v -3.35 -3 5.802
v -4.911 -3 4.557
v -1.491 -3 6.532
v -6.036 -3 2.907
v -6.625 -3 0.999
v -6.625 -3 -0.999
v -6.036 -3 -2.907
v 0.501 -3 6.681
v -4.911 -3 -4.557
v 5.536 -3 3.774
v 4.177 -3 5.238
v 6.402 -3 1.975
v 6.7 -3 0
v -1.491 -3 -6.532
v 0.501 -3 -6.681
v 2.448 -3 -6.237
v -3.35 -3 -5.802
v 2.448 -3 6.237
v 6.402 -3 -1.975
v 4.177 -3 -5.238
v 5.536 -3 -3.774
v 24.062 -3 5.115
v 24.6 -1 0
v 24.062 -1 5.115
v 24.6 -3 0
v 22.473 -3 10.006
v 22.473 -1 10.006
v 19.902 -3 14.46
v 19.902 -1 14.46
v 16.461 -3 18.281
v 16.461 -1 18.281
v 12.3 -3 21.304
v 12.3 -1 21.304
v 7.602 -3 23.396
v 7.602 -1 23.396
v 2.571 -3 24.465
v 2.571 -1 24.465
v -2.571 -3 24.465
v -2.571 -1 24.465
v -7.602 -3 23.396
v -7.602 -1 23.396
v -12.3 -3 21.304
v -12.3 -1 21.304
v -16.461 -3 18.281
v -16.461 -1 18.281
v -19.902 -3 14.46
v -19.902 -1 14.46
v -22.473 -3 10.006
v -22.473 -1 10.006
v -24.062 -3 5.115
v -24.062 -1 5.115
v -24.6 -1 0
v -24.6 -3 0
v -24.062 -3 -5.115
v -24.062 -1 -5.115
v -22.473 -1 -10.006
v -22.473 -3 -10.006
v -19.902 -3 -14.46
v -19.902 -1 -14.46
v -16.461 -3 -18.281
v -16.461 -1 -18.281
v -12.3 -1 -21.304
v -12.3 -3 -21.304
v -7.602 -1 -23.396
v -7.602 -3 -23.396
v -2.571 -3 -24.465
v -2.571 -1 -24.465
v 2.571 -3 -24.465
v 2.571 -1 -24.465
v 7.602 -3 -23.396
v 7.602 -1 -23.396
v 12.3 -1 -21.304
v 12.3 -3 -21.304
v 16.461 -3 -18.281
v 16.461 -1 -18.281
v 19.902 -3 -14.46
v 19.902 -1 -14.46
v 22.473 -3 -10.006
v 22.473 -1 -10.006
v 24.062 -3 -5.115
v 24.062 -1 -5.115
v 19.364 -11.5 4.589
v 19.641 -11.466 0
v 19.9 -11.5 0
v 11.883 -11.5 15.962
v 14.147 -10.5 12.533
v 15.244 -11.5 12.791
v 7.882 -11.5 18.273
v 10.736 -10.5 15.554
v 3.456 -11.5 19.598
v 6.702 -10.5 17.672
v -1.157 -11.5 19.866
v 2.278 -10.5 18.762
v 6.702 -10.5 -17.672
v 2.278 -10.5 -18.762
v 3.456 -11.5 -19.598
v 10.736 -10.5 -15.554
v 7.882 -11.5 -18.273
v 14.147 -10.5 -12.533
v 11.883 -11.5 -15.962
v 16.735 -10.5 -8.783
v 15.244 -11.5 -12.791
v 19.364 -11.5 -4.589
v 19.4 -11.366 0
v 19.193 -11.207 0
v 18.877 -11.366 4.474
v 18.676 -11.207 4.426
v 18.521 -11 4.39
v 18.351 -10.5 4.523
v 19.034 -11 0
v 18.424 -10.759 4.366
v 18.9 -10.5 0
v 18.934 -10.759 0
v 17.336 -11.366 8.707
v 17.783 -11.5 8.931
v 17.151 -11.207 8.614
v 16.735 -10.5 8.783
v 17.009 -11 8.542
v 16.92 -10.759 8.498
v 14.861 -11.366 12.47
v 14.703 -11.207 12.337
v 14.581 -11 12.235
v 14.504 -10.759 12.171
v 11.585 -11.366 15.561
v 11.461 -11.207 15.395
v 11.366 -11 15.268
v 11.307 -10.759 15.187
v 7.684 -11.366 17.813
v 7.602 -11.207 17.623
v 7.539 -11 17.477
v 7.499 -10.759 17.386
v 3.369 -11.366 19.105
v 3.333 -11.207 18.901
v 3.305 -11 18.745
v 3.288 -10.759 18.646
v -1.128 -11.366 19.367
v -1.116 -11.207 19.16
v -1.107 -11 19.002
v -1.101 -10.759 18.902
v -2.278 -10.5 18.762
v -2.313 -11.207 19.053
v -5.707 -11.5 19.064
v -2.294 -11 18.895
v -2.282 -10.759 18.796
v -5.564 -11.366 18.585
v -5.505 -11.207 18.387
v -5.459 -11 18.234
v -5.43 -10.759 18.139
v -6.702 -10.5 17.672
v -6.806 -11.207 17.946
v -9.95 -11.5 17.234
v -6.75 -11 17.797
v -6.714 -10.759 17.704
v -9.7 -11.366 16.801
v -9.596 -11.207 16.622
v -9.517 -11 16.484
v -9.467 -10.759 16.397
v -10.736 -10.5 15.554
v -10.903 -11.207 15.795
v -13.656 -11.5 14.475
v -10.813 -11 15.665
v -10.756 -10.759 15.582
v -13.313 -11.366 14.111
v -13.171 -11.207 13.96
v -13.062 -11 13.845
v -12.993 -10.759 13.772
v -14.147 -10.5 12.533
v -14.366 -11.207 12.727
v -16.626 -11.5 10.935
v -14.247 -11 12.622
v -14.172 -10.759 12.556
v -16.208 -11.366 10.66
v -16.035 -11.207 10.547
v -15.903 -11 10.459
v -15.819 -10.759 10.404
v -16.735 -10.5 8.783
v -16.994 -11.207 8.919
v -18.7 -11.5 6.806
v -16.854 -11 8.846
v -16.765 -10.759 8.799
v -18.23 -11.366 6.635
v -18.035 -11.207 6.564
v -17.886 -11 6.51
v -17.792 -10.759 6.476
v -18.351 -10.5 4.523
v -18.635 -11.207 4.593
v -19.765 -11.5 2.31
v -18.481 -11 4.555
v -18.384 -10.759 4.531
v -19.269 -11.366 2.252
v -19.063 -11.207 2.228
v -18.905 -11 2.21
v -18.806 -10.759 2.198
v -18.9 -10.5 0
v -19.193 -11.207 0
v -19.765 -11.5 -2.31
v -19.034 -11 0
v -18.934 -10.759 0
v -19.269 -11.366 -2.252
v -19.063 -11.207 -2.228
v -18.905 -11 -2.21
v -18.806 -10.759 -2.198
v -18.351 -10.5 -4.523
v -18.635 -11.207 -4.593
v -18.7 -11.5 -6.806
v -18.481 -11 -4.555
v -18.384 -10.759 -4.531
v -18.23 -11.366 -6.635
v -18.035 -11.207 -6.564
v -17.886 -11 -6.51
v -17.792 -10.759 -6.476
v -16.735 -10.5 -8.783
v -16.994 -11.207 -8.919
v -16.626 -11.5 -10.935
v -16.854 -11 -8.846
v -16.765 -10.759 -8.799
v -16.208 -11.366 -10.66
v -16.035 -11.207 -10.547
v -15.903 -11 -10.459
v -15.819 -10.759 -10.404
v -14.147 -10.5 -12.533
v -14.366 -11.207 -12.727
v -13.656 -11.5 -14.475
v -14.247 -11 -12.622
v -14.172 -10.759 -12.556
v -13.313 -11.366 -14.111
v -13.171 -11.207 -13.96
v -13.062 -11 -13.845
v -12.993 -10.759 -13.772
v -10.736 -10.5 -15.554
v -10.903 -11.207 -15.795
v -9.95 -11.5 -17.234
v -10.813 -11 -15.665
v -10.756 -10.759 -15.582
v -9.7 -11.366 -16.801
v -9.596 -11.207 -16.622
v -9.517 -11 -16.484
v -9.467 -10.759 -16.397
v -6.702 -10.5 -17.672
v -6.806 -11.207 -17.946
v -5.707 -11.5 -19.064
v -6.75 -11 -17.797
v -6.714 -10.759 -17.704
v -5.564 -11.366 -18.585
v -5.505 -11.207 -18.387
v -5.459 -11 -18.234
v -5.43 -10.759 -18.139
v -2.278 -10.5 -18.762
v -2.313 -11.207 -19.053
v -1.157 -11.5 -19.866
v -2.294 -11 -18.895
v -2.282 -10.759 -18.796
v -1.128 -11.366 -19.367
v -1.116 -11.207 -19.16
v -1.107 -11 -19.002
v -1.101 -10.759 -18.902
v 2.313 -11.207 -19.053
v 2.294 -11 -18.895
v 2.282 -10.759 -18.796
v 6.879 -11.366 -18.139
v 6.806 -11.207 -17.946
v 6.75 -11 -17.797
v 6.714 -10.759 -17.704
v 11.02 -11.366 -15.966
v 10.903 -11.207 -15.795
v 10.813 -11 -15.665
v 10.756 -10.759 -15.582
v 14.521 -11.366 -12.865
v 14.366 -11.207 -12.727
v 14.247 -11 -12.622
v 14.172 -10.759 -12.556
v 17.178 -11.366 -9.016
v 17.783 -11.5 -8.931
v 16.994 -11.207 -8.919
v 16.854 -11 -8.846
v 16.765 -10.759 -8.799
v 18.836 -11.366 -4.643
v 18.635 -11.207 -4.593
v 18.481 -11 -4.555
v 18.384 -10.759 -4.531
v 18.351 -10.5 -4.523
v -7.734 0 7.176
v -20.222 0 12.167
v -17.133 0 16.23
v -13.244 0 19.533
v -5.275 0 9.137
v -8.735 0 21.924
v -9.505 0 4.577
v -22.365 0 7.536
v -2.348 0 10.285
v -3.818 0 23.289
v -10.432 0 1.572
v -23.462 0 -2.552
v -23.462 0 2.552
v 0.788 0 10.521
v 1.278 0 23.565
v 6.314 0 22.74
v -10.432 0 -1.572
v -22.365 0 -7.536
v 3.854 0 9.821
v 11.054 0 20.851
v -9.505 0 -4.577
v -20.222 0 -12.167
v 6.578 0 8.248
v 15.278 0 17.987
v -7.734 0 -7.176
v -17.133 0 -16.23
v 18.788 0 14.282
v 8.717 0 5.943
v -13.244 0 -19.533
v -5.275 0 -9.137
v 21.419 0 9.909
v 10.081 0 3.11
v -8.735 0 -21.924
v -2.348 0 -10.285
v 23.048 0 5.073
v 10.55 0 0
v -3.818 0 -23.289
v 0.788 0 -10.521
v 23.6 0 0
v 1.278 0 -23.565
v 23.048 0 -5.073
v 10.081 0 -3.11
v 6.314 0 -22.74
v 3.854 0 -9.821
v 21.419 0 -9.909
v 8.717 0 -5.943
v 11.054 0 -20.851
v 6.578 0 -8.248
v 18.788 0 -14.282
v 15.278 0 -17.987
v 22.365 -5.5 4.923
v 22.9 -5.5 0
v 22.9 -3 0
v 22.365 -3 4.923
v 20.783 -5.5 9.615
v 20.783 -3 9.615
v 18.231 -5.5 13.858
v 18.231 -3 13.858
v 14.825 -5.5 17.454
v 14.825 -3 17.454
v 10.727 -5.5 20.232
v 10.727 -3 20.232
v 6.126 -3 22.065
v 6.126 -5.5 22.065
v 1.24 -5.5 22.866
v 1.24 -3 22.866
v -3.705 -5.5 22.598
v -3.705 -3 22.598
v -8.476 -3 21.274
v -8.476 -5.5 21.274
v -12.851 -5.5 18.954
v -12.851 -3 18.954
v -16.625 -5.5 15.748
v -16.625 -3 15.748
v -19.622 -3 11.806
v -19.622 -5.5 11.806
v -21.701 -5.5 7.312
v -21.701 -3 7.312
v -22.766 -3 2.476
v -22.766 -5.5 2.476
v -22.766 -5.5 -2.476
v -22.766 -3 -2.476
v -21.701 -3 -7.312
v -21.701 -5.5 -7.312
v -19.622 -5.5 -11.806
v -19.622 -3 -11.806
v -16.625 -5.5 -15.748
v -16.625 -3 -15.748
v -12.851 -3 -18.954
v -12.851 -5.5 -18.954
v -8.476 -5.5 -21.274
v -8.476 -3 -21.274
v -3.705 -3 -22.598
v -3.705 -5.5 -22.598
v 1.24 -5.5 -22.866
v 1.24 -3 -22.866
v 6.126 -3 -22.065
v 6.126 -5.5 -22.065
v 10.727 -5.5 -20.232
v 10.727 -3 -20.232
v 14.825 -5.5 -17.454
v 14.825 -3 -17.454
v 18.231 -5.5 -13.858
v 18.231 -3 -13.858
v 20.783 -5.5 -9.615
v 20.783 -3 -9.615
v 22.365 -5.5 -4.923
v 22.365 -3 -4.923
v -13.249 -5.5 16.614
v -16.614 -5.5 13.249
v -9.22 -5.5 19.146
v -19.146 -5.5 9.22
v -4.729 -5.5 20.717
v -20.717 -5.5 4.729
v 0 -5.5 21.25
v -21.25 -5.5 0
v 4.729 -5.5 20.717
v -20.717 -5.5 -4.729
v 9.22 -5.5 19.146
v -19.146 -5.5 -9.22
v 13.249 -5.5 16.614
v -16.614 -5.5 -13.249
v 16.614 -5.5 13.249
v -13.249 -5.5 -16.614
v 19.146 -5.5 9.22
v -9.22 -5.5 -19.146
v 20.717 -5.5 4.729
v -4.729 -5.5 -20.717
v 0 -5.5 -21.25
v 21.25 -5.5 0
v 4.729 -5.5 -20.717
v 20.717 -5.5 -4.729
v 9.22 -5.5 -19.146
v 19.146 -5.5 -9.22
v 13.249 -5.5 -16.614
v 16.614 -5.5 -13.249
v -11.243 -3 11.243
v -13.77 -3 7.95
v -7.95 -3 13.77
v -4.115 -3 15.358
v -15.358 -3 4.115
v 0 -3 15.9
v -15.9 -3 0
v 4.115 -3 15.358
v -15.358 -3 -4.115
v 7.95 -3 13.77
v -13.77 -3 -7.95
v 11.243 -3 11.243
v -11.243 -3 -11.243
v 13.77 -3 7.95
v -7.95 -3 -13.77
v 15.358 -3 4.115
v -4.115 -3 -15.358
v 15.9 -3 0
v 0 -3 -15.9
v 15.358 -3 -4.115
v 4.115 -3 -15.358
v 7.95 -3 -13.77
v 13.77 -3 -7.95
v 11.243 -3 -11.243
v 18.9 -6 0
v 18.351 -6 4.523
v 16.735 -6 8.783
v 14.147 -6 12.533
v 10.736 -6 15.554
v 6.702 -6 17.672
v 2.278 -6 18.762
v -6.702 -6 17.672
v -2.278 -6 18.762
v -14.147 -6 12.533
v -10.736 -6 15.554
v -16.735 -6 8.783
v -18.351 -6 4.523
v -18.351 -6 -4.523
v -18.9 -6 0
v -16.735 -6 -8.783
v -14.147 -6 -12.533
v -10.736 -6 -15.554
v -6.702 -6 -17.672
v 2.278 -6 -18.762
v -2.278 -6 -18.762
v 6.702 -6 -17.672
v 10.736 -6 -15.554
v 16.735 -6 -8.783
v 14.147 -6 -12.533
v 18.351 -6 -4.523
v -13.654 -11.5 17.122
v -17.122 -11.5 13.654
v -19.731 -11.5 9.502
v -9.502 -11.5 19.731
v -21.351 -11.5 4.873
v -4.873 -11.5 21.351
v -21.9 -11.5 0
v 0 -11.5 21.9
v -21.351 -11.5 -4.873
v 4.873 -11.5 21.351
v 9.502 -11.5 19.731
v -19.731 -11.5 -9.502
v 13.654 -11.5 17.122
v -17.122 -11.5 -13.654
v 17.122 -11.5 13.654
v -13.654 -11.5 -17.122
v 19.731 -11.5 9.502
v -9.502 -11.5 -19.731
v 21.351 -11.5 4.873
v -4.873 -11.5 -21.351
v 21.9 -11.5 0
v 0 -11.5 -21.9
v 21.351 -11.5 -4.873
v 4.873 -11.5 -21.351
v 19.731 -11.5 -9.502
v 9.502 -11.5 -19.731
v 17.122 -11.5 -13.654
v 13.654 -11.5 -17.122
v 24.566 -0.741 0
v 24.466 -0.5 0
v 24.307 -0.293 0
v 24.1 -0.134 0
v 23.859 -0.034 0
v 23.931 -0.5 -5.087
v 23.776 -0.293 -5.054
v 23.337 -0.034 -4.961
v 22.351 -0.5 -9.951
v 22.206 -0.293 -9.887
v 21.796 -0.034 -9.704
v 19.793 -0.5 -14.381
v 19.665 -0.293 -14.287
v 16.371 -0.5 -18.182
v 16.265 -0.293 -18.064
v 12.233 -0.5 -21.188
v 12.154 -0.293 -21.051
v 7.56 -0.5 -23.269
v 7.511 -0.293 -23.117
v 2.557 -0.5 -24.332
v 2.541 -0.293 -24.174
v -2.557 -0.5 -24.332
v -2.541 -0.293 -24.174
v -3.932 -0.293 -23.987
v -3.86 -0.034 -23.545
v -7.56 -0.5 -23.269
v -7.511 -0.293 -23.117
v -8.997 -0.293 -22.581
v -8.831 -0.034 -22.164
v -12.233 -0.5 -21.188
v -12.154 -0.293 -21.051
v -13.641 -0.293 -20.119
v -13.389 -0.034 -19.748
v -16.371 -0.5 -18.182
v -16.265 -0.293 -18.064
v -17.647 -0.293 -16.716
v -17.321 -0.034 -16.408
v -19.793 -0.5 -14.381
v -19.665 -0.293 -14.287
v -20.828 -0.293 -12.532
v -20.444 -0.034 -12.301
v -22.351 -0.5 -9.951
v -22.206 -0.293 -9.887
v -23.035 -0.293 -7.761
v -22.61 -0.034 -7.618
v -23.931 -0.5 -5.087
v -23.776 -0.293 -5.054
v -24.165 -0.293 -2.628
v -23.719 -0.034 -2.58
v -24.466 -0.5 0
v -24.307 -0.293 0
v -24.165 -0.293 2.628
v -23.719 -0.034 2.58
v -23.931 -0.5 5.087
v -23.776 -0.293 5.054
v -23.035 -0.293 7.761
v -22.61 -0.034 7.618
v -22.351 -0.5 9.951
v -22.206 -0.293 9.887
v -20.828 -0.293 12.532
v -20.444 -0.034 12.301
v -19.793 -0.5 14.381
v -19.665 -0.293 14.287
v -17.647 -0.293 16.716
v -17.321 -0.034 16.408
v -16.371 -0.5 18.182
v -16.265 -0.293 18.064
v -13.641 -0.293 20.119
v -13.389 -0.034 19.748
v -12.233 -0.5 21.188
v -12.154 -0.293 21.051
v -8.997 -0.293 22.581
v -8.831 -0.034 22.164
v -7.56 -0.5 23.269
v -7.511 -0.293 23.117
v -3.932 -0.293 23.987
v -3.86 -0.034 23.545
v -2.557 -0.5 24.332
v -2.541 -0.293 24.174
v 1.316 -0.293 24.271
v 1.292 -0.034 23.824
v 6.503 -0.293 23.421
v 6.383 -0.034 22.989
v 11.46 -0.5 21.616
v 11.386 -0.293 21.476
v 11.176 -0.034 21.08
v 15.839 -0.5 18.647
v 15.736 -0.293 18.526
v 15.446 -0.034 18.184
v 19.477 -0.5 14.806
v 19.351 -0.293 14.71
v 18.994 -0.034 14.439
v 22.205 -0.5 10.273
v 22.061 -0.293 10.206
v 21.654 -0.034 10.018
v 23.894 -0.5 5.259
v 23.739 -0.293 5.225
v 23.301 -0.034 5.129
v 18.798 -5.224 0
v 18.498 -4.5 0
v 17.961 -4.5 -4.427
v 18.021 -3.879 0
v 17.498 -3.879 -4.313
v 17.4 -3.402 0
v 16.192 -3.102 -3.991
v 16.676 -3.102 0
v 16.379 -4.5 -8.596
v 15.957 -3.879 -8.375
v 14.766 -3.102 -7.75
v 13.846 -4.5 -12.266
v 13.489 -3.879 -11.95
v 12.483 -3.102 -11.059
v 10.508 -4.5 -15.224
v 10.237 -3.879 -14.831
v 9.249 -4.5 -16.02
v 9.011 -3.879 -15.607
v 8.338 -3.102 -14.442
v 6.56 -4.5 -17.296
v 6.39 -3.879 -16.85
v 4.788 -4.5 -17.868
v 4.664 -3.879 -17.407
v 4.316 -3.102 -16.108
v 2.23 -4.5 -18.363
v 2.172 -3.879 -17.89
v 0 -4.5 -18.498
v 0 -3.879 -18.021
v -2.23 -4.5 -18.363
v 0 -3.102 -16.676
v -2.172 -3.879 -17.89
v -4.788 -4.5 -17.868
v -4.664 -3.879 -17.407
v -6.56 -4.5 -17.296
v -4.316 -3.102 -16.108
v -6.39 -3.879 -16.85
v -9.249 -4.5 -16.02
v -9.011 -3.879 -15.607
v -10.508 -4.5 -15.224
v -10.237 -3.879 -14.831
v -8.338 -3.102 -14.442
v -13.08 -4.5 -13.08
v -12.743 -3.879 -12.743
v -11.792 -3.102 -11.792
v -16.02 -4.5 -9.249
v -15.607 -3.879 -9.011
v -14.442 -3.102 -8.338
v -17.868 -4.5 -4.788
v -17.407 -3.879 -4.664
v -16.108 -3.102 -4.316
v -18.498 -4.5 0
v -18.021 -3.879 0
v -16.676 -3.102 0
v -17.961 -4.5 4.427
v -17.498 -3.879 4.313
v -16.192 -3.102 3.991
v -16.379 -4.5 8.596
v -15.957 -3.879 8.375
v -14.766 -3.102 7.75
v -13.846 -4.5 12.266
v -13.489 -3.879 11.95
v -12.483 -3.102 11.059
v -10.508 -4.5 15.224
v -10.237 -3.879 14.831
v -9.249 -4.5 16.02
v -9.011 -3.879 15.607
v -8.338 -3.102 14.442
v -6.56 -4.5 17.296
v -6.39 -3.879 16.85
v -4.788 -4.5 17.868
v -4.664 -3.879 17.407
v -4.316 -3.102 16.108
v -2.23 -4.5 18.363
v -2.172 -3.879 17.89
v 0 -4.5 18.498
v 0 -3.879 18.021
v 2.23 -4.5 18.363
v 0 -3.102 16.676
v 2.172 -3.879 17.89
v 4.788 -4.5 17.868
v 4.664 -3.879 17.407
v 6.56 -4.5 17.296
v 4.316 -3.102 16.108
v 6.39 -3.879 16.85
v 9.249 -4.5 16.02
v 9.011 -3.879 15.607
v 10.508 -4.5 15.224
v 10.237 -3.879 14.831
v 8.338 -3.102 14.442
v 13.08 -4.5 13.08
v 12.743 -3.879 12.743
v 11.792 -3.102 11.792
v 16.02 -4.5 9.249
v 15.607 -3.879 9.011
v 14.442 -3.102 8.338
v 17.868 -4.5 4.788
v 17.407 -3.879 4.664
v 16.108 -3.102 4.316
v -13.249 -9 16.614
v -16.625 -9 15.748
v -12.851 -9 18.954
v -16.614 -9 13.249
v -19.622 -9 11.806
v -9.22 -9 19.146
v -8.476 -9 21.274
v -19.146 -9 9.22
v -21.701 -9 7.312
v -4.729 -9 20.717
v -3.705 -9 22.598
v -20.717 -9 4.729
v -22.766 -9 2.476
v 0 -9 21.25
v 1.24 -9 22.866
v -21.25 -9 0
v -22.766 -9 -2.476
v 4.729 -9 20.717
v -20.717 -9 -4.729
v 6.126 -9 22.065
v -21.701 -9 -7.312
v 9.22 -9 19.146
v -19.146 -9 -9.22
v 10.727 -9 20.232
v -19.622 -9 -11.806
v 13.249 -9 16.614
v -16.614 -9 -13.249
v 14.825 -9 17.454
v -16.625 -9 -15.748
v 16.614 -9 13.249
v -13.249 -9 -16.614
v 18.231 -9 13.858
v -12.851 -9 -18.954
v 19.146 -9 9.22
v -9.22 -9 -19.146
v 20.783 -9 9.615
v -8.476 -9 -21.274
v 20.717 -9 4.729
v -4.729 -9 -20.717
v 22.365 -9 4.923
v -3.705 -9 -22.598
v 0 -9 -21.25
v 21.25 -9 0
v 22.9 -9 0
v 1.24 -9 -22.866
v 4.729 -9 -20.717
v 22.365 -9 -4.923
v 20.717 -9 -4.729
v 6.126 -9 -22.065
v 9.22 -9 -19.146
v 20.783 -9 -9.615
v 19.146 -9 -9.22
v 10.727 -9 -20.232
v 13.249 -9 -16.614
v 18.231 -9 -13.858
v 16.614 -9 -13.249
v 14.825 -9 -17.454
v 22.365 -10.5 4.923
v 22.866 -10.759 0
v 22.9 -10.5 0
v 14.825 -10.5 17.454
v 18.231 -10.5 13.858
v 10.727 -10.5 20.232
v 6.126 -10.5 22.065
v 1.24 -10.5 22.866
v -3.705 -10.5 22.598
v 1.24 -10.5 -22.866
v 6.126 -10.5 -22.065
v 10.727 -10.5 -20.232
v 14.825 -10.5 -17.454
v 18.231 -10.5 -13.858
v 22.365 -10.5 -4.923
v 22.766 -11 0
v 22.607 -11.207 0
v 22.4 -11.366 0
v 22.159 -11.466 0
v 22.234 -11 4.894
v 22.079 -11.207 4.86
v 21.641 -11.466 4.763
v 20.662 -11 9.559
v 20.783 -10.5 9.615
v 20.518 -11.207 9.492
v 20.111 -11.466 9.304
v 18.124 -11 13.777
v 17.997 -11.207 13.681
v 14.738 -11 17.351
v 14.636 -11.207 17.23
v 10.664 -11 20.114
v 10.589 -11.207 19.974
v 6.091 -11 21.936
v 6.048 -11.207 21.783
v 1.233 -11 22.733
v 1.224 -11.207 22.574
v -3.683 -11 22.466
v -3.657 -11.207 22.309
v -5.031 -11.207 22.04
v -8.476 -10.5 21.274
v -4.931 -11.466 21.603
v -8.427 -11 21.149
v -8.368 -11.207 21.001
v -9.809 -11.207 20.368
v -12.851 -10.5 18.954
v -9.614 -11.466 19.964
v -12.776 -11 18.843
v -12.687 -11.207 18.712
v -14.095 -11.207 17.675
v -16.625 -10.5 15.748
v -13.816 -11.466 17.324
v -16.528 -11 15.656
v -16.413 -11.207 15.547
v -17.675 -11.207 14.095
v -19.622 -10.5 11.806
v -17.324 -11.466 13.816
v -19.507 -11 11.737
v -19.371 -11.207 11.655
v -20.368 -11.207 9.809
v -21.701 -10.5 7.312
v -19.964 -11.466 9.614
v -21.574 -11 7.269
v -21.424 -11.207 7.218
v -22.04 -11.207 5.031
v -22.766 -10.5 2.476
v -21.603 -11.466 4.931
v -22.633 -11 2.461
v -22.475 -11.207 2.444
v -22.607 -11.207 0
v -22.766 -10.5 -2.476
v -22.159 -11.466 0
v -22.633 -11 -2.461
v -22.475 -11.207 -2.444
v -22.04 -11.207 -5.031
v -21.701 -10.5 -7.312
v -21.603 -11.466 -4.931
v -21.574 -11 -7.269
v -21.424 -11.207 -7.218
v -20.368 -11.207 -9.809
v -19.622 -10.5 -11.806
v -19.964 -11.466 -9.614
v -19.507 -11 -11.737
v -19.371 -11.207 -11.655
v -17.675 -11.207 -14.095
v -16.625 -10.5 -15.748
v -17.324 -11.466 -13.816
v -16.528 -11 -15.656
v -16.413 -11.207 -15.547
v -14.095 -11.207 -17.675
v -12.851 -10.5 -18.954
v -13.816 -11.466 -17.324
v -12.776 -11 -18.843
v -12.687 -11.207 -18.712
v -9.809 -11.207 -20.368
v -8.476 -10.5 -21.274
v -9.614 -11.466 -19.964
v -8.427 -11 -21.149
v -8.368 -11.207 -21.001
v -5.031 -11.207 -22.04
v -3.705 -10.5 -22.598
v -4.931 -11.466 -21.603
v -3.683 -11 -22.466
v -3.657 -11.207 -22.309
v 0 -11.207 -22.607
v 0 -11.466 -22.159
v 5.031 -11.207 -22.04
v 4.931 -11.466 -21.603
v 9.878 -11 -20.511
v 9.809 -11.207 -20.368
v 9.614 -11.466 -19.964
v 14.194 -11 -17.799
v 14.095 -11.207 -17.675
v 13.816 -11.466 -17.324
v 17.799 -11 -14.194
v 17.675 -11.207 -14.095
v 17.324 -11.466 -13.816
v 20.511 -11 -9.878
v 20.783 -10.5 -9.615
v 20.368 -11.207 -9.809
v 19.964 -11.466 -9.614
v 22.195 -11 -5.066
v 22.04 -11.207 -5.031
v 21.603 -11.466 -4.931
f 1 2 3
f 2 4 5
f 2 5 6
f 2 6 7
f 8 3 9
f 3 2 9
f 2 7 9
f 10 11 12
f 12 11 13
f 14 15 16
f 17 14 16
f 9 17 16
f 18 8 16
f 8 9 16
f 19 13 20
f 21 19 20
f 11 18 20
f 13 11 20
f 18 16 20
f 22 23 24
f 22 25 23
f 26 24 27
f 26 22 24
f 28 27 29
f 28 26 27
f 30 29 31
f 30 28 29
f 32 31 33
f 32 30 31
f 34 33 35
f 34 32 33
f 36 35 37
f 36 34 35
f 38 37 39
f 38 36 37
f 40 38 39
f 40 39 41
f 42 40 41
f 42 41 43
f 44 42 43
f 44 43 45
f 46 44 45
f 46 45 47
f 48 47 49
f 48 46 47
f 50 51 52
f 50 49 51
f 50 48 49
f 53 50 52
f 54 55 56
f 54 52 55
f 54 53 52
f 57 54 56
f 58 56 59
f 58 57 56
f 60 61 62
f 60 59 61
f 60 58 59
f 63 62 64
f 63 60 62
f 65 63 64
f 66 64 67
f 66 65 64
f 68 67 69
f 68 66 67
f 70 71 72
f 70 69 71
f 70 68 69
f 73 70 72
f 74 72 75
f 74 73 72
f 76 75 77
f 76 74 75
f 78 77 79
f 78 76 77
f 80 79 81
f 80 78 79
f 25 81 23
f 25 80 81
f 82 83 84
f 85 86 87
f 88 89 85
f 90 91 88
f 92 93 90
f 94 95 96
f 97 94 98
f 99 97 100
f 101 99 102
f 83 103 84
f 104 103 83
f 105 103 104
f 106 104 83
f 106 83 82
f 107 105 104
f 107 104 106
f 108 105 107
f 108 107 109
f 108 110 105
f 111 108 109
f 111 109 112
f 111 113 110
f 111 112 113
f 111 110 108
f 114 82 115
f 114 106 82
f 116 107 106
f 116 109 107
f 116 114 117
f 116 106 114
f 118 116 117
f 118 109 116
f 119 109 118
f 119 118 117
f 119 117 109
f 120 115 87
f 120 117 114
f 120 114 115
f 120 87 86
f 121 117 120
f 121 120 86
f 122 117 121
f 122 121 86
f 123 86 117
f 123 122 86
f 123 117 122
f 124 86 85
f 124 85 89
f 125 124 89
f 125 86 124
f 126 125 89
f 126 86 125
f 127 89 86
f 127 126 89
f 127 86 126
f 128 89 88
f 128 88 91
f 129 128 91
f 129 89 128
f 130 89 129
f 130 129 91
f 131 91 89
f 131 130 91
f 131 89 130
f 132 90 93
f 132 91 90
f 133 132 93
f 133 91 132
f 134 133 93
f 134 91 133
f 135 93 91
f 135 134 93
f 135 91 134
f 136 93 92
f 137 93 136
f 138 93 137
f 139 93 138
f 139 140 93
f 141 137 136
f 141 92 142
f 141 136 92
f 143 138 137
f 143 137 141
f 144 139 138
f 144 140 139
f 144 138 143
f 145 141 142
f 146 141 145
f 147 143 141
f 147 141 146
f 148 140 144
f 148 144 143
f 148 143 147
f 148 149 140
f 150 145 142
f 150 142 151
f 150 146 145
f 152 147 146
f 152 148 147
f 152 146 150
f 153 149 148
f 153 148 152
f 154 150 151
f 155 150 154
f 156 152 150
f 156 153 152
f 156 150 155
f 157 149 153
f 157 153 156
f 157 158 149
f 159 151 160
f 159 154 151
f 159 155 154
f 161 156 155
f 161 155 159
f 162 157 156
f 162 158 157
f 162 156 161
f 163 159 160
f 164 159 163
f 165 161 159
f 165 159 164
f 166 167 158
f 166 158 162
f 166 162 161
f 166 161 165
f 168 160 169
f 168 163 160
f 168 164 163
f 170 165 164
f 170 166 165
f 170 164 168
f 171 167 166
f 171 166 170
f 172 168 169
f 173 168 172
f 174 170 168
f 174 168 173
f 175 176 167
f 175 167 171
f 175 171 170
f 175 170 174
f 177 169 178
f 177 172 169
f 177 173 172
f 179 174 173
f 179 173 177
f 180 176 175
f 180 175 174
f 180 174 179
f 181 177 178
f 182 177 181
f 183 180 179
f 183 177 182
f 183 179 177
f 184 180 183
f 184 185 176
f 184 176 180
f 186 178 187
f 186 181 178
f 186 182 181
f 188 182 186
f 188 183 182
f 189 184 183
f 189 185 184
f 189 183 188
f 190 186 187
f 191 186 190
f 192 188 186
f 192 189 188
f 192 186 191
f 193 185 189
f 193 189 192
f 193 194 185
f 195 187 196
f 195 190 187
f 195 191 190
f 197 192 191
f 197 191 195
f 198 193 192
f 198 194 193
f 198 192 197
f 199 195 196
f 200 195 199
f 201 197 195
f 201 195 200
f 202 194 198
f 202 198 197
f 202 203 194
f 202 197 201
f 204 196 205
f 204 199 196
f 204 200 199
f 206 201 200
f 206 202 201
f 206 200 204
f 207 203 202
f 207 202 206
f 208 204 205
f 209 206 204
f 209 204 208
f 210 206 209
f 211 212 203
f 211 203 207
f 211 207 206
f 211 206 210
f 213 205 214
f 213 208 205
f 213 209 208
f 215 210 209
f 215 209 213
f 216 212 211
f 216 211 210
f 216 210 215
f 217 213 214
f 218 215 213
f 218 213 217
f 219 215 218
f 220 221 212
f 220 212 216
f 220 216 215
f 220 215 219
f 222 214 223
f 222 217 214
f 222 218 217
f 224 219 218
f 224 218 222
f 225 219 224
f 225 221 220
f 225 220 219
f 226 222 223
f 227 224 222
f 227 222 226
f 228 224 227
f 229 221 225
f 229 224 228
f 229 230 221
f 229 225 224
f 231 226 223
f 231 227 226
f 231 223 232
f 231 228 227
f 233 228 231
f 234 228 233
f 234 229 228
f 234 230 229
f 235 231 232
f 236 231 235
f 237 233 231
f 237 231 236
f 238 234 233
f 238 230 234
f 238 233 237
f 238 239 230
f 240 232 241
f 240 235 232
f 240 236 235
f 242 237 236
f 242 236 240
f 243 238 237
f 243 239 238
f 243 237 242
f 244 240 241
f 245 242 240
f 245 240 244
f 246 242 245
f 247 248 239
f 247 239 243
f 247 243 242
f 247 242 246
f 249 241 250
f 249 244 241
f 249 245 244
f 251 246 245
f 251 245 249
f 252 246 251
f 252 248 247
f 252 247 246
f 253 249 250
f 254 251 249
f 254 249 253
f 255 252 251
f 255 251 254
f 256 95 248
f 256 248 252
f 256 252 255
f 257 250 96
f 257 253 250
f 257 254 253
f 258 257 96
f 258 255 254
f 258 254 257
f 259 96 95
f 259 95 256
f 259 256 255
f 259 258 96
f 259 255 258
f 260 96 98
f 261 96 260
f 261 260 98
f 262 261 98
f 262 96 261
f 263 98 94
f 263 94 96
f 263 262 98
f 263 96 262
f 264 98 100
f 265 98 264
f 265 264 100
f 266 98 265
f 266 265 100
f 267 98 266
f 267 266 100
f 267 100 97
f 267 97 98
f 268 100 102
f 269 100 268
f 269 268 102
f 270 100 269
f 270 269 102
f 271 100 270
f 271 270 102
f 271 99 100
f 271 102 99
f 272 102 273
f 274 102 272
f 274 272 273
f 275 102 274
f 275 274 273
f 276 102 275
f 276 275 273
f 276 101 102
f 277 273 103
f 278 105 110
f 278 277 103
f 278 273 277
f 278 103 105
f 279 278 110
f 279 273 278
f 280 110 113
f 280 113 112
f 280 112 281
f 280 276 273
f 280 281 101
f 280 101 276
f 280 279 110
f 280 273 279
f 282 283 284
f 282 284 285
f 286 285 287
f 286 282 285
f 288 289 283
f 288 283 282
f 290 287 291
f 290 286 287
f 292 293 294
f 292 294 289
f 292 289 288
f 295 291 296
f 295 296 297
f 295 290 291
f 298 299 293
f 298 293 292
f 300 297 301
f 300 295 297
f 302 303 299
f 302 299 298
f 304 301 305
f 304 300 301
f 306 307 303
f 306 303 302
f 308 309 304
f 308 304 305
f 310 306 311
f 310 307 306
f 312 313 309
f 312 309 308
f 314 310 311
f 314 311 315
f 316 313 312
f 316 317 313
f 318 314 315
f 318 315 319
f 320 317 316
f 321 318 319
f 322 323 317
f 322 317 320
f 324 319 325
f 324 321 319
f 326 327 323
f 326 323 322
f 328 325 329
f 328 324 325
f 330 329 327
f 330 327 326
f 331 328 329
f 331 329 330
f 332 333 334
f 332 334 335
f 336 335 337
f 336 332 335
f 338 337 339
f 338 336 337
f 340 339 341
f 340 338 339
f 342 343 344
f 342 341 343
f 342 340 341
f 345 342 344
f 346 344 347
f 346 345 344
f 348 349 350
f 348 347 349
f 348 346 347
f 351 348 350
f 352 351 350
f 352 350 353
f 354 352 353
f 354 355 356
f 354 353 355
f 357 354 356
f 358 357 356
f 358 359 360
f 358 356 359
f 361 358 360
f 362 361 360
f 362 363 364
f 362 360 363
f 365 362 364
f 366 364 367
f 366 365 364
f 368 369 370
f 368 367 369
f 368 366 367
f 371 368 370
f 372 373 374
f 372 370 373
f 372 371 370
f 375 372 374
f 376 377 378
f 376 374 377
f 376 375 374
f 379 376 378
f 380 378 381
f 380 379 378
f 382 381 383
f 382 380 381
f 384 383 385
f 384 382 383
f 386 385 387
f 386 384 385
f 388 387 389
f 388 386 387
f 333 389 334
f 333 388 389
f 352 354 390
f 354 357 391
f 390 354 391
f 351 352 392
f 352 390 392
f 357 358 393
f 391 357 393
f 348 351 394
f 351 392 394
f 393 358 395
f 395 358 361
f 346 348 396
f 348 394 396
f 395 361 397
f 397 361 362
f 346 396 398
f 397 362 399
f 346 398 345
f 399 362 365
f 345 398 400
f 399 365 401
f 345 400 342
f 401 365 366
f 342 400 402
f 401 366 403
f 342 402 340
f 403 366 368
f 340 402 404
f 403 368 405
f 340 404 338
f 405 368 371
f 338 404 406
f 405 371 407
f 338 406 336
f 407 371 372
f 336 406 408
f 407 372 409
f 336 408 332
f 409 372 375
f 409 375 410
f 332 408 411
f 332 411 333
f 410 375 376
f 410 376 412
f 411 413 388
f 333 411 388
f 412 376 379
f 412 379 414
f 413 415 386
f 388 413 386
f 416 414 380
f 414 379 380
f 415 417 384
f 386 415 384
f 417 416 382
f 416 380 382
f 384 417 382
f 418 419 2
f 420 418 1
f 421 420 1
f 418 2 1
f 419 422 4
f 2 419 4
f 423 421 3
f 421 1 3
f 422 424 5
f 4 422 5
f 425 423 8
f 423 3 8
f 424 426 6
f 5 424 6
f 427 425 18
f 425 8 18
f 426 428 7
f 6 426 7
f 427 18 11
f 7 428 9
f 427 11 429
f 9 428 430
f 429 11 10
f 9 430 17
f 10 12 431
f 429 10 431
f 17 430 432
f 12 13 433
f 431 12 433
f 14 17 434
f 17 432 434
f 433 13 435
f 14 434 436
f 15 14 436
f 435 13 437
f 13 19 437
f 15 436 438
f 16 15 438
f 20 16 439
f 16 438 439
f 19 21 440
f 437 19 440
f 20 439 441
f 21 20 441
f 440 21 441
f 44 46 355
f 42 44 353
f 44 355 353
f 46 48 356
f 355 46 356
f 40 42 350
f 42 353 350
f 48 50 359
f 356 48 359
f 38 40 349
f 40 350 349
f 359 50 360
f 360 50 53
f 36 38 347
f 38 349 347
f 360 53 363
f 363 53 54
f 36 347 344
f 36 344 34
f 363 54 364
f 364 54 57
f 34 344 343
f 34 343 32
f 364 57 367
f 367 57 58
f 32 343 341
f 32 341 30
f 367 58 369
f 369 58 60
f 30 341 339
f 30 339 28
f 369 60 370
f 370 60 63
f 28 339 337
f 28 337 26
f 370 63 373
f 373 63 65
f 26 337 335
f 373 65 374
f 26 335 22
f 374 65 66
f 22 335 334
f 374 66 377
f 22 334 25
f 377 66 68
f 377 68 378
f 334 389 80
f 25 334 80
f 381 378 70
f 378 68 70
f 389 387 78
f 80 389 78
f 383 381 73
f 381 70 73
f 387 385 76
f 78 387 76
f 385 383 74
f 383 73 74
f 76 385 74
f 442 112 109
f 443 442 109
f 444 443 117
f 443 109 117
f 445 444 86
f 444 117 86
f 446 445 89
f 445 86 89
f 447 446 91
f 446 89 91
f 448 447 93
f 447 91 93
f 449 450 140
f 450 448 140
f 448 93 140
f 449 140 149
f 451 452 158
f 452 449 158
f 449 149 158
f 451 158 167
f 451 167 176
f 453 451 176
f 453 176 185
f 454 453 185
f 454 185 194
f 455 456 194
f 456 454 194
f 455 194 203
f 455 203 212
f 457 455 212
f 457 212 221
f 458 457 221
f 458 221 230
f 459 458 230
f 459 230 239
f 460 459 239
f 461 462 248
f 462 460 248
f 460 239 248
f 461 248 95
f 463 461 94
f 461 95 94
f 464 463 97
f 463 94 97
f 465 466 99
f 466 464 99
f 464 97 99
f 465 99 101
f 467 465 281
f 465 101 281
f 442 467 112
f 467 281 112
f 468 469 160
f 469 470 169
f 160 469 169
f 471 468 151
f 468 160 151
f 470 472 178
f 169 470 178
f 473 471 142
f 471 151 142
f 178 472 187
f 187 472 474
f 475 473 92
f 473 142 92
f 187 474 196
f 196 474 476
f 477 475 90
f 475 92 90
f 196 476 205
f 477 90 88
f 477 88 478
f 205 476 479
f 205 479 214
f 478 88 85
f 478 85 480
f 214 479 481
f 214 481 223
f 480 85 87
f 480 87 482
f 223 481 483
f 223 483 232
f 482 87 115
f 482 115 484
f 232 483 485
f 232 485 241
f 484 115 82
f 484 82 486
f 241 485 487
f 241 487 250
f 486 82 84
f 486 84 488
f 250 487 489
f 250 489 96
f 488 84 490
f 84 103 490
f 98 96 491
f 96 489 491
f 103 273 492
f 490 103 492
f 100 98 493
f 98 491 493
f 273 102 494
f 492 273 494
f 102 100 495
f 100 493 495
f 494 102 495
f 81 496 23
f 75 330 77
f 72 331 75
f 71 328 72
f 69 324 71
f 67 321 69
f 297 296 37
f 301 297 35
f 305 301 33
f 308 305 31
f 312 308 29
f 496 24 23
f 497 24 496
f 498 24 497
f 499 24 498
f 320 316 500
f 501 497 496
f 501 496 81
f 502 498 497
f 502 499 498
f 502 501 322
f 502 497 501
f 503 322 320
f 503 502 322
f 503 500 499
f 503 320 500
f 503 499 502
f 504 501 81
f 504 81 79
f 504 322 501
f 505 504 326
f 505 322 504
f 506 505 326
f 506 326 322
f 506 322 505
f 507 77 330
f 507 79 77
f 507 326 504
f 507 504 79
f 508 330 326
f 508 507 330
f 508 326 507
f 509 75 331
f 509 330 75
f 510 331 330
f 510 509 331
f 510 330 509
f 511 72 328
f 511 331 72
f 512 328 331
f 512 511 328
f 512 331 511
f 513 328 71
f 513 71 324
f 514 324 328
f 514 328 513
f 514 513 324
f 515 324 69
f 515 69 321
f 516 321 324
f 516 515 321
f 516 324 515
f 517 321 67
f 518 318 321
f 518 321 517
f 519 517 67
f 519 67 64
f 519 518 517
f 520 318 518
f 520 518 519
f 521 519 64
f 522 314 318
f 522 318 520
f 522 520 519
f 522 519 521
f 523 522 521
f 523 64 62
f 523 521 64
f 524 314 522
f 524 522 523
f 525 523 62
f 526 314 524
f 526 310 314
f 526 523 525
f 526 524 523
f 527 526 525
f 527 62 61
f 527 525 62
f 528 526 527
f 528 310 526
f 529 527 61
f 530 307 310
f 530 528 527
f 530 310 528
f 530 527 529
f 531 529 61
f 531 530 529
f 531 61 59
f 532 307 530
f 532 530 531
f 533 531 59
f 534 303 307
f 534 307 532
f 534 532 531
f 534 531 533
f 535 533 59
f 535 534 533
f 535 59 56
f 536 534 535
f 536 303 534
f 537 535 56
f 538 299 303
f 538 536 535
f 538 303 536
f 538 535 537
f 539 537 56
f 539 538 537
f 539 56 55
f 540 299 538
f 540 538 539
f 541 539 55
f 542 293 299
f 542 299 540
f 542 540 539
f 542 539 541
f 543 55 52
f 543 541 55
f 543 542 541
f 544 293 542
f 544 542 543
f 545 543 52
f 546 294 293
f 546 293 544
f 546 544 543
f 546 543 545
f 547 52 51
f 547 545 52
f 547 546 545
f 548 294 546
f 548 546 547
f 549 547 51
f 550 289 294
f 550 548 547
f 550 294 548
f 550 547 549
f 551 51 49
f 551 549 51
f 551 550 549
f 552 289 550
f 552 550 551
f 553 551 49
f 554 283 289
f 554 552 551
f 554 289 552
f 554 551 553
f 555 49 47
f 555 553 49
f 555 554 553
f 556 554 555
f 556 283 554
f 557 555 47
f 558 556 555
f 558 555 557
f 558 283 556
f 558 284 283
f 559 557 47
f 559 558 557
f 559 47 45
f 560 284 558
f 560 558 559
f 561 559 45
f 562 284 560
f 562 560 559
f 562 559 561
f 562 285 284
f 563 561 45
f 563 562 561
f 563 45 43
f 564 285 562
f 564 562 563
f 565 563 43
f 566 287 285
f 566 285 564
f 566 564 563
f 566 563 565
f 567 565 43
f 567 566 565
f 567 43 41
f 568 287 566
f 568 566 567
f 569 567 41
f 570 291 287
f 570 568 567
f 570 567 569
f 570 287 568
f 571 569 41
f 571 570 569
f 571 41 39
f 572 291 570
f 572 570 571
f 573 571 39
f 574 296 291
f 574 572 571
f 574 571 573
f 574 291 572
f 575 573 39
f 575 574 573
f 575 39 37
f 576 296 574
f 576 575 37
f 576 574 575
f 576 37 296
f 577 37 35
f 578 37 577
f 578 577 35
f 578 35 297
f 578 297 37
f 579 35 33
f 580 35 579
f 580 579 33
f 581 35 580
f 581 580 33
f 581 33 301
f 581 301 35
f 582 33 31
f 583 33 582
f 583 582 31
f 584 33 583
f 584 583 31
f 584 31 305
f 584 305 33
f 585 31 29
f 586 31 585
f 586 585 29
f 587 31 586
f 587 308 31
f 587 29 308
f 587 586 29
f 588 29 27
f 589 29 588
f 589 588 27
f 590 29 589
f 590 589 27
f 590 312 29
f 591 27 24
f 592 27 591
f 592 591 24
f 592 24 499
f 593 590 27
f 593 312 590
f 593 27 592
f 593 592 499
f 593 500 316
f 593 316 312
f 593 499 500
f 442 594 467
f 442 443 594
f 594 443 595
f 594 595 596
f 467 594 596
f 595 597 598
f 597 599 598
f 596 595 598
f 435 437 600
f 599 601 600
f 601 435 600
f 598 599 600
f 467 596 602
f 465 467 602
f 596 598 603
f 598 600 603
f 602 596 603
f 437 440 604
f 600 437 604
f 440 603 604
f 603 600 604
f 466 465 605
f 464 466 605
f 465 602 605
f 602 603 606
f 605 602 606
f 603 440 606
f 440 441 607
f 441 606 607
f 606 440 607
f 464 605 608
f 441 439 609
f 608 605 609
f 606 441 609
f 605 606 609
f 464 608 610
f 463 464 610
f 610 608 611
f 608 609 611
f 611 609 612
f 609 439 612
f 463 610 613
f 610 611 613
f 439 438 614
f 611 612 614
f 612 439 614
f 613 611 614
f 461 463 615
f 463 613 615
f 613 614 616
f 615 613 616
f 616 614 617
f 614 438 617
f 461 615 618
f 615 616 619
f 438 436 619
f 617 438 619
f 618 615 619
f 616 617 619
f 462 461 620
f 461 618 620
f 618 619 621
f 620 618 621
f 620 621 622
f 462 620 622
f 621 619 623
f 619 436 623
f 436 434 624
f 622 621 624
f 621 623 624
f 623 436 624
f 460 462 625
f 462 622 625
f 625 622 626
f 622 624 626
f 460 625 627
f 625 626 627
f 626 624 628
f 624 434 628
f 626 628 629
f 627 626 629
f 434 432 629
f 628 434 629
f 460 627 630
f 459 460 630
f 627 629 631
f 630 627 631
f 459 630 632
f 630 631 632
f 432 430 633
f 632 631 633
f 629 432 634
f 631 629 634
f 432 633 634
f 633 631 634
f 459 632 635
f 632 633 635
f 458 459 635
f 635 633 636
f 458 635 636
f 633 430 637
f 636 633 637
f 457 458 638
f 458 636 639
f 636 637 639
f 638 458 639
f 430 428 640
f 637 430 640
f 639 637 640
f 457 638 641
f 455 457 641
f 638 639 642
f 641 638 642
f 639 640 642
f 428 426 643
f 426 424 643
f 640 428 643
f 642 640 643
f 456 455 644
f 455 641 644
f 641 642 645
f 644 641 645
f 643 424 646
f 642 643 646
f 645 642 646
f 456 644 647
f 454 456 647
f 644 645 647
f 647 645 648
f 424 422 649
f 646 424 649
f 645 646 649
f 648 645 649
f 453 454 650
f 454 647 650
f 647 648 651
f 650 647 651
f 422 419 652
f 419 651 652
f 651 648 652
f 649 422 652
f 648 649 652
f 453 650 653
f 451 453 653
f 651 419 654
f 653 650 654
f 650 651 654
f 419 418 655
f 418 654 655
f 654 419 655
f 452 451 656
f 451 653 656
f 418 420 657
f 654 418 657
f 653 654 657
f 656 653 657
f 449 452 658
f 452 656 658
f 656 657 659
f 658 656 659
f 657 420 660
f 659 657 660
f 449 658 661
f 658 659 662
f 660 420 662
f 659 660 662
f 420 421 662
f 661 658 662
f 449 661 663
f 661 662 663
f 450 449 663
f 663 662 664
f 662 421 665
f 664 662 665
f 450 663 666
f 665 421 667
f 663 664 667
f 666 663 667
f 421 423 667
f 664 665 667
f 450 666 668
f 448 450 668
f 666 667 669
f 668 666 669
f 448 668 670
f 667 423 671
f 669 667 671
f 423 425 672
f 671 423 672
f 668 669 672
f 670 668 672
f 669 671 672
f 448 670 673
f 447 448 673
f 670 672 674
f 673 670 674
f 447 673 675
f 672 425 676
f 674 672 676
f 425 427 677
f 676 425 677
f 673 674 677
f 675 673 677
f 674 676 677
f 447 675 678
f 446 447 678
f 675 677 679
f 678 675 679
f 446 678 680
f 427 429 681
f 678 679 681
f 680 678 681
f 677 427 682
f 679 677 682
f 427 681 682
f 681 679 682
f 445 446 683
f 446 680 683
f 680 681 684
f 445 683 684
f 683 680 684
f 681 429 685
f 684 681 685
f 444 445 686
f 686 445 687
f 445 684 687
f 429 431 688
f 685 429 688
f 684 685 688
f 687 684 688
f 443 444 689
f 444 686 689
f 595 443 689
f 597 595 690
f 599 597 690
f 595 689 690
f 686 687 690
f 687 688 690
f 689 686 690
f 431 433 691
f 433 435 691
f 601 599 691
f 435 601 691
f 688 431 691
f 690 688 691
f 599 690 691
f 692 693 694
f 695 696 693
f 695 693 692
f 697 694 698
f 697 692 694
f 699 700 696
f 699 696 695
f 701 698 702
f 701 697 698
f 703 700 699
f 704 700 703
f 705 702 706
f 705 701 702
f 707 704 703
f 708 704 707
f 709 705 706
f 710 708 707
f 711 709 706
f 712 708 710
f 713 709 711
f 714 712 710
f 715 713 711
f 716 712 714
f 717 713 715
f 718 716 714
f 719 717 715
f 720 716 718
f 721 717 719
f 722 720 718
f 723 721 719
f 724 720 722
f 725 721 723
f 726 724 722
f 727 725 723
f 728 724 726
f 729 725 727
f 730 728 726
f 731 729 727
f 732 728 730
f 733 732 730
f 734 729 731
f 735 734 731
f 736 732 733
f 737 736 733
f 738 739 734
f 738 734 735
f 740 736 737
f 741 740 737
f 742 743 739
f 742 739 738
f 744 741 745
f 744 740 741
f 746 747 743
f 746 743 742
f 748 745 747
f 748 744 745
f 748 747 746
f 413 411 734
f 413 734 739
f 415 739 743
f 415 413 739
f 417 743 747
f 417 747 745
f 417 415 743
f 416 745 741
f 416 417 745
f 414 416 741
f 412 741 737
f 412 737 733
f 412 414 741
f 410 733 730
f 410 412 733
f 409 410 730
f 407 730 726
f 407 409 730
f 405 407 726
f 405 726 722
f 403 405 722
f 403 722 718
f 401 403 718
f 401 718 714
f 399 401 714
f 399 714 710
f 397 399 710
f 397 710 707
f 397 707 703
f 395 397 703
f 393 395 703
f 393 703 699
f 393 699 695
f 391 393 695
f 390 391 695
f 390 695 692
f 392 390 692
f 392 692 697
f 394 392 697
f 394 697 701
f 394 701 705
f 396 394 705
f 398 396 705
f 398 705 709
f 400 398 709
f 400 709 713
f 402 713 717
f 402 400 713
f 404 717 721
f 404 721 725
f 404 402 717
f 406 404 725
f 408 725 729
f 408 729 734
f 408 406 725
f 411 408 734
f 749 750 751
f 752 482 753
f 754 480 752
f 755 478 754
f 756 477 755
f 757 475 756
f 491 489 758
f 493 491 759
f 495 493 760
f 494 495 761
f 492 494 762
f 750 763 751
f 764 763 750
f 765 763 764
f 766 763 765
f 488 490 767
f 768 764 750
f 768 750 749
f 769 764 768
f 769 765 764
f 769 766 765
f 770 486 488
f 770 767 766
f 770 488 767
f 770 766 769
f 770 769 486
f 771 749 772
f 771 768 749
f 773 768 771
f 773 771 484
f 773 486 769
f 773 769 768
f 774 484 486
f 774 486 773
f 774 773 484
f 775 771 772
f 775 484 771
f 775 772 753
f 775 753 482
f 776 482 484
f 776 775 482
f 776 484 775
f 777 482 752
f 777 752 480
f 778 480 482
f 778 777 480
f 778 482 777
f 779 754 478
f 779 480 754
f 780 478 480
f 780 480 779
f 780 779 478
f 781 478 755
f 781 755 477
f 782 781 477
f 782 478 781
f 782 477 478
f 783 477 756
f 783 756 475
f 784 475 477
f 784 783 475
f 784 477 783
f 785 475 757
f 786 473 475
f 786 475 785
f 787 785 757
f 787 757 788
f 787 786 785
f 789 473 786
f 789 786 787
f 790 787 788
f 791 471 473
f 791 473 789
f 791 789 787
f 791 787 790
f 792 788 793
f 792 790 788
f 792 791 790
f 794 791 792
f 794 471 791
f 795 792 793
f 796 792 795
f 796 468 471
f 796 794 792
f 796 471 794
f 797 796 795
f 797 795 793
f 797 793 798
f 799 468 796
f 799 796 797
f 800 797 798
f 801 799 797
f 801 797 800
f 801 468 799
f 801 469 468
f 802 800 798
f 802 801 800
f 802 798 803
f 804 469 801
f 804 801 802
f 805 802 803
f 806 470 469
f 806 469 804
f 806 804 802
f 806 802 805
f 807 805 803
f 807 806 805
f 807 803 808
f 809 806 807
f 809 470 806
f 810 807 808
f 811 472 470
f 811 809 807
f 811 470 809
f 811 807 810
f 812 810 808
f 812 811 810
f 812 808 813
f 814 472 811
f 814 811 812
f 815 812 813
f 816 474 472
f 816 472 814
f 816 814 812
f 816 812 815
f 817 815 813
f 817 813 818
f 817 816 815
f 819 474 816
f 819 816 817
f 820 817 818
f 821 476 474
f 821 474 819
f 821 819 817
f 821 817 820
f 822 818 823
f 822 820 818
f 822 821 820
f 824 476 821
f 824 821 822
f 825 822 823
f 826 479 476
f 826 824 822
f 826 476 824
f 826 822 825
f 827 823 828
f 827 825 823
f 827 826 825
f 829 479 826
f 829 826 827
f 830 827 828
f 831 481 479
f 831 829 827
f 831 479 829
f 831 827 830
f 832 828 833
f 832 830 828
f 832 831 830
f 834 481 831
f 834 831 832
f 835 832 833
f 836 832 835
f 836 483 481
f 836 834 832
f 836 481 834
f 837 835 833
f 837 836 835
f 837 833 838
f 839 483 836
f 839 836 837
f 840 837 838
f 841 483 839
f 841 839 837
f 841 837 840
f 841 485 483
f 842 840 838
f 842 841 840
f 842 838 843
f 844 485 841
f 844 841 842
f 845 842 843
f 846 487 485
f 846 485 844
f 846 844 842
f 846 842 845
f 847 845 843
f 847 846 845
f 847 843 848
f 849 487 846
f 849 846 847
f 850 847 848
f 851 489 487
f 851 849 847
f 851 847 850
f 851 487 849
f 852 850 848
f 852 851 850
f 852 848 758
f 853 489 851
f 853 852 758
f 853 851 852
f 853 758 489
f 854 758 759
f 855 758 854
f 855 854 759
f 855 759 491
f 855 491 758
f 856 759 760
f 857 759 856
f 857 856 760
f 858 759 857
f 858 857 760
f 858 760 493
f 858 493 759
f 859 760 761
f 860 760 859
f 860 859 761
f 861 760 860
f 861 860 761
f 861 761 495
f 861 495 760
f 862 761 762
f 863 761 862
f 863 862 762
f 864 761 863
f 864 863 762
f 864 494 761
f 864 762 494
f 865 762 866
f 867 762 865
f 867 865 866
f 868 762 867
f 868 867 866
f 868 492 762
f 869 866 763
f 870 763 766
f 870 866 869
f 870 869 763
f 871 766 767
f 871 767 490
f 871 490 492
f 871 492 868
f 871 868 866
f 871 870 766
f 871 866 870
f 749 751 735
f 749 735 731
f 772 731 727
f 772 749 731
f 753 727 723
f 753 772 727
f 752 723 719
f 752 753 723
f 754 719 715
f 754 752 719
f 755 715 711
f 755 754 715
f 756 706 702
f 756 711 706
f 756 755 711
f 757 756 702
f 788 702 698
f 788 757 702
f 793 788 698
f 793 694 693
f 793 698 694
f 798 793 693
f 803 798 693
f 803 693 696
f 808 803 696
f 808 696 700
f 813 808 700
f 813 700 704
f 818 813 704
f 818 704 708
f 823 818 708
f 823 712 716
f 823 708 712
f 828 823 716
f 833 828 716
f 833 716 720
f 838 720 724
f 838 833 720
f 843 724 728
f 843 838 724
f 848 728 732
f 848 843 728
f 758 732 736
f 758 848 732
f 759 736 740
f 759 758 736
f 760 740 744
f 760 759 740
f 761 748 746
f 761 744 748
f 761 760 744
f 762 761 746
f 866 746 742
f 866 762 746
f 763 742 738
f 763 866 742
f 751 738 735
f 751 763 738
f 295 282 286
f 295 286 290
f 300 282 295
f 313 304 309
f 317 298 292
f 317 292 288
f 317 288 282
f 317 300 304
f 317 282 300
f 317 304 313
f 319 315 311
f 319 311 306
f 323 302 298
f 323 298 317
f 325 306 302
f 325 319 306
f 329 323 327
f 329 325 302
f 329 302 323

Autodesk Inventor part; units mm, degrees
ref_plane "YZ Plane" through (0, 0, 0) normal (1, 0, 0) x (0, 1, 0)
ref_plane "XZ Plane" through (0, 0, 0) normal (0, 1, 0) x (-1, 0, 0)
ref_plane "XY Plane" through (0, 0, 0) normal (0, 0, 1) x (1, 0, 0)
sketch "Sketch1" plane through (0, 0, 0) normal (0, 0, 1) x (1, 0, 0)
  line L0 (-24.6, 0) -> (24.6, 0) construction
  line L1 (24.6, 0) -> (24.6, -3)
  line L2 (24.6, -3) -> (-24.6, -3) construction
  line L3 (-24.6, -3) -> (-24.6, 0)
  line L4 (-22.9, -3) -> (22.9, -3) construction
  line L5 (22.9, -3) -> (22.9, -11.5) construction
  line L6 (22.9, -11.5) -> (-22.9, -11.5) construction
  line L7 (-22.9, -11.5) -> (-22.9, -3)
  line L8 (22.9, -9) -> (21.25, -9)
  line L9 (21.25, -9) -> (21.25, -5.5)
  line L10 (21.25, -5.5) -> (22.9, -5.5)
  line L11 (22.9, -5.5) -> (22.9, -9) construction
  line L12 (-10.55, 40) -> (10.55, 40) construction
  line L13 (10.55, 40) -> (10.55, 0) construction
  line L14 (10.55, 0) -> (-10.55, 0) construction
  line L15 (-10.55, 0) -> (-10.55, 40) construction
  line L16 (-10.92, 40) -> (10.92, 40) construction
  line L17 (-11.19, 19) -> (11.19, 19) construction
  line L18 (-10.92, 40) -> (-11.19, 19)
  line L19 (10.92, 40) -> (11.19, 19)
  line L20 (-6.7, 40) -> (6.7, 40) construction
  line L21 (6.7, 40) -> (6.7, -3) construction
  line L22 (6.7, -3) -> (-6.7, -3) construction
  line L23 (-6.7, -3) -> (-6.7, 40) construction
  line L24 (-18.9, -3) -> (18.9, -3) construction
  line L25 (18.9, -3) -> (18.9, -11.5)
  line L26 (18.9, -11.5) -> (-18.9, -11.5) construction
  line L27 (-18.9, -11.5) -> (-18.9, -3)
  line L28 (-22.9, -11.5) -> (-18.9, -11.5)
  line L29 (18.9, -11.5) -> (22.9, -11.5)
  line L30 (-24.6, -3) -> (-22.9, -3)
  line L31 (-18.9, -3) -> (-6.7, -3)
  line L32 (6.7, -3) -> (18.9, -3)
  line L33 (22.9, -3) -> (24.6, -3)
  line L34 (22.9, -3) -> (22.9, -5.5)
  line L35 (22.9, -9) -> (22.9, -11.5)
  line L36 (10.55, 0) -> (24.6, 0)
  line L37 (-10.92, 40) -> (-6.7, 40)
  line L38 (6.7, 40) -> (10.92, 40)
  line L39 (10.55, 0) -> (10.55, 19)
  line L40 (10.55, 19) -> (11.19, 19)
  line L41 (-11.19, 19) -> (-10.55, 19)
  line L42 (-10.55, 19) -> (-10.55, 5.3907)
  line L43 (-6.7, 40) -> (-6.7, -3)
  line L44 (6.7, 40) -> (6.7, -3) construction
  line L45 (10.55, 0) -> (24.6, 0)
  line L46 (0, -21.8) -> (0, 50.3) projected
  line L47 (6.7, -3) -> (0, -3)
  line L48 (0, -3) -> (0, 0)
  line L49 (0, 0) -> (24.6, 0)
  point P0 (0, -3)
  point P1 (22.9, -7.25)
  point P2 (22.9, -7.25)
  point P3 (0, 40)
  point P4 (0, 19)
  point P5 (0, 40)
  point P6 (0, -11.5)
  point P7 (-22.9, -7.25)
  dimension "d0" = 49.2
  dimension "d1" = 3
  dimension "d2" = 45.8
  dimension "d3" = 8.5
  dimension "d4" = 3.5
  dimension "d5" = 1.65
  dimension "d6" = 40
  dimension "d7" = 21.1
  dimension "d8" = 21.84
  dimension "d9" = 22.38
  dimension "d10" = 21
  dimension "d11" = 13.4
  dimension "d12" = 4
revolve "Revolution1" add sketch "Sketch1" angle 360 about axis through (0, -10, 0) along (0, 1, 0)
fillet "Fillet1" radius 1 3 edges at (-24.6, 0, 0) (-22.9, -11.5, 0) (-18.9, -11.5, 0)
fillet "Fillet2" radius 3 3 edges at (-10.55, 0, 0) (-6.7, -3, 0) (-18.9, -3, 0)
properties part number "Rebreather-HoseAdapterInsert_3DPrint"
